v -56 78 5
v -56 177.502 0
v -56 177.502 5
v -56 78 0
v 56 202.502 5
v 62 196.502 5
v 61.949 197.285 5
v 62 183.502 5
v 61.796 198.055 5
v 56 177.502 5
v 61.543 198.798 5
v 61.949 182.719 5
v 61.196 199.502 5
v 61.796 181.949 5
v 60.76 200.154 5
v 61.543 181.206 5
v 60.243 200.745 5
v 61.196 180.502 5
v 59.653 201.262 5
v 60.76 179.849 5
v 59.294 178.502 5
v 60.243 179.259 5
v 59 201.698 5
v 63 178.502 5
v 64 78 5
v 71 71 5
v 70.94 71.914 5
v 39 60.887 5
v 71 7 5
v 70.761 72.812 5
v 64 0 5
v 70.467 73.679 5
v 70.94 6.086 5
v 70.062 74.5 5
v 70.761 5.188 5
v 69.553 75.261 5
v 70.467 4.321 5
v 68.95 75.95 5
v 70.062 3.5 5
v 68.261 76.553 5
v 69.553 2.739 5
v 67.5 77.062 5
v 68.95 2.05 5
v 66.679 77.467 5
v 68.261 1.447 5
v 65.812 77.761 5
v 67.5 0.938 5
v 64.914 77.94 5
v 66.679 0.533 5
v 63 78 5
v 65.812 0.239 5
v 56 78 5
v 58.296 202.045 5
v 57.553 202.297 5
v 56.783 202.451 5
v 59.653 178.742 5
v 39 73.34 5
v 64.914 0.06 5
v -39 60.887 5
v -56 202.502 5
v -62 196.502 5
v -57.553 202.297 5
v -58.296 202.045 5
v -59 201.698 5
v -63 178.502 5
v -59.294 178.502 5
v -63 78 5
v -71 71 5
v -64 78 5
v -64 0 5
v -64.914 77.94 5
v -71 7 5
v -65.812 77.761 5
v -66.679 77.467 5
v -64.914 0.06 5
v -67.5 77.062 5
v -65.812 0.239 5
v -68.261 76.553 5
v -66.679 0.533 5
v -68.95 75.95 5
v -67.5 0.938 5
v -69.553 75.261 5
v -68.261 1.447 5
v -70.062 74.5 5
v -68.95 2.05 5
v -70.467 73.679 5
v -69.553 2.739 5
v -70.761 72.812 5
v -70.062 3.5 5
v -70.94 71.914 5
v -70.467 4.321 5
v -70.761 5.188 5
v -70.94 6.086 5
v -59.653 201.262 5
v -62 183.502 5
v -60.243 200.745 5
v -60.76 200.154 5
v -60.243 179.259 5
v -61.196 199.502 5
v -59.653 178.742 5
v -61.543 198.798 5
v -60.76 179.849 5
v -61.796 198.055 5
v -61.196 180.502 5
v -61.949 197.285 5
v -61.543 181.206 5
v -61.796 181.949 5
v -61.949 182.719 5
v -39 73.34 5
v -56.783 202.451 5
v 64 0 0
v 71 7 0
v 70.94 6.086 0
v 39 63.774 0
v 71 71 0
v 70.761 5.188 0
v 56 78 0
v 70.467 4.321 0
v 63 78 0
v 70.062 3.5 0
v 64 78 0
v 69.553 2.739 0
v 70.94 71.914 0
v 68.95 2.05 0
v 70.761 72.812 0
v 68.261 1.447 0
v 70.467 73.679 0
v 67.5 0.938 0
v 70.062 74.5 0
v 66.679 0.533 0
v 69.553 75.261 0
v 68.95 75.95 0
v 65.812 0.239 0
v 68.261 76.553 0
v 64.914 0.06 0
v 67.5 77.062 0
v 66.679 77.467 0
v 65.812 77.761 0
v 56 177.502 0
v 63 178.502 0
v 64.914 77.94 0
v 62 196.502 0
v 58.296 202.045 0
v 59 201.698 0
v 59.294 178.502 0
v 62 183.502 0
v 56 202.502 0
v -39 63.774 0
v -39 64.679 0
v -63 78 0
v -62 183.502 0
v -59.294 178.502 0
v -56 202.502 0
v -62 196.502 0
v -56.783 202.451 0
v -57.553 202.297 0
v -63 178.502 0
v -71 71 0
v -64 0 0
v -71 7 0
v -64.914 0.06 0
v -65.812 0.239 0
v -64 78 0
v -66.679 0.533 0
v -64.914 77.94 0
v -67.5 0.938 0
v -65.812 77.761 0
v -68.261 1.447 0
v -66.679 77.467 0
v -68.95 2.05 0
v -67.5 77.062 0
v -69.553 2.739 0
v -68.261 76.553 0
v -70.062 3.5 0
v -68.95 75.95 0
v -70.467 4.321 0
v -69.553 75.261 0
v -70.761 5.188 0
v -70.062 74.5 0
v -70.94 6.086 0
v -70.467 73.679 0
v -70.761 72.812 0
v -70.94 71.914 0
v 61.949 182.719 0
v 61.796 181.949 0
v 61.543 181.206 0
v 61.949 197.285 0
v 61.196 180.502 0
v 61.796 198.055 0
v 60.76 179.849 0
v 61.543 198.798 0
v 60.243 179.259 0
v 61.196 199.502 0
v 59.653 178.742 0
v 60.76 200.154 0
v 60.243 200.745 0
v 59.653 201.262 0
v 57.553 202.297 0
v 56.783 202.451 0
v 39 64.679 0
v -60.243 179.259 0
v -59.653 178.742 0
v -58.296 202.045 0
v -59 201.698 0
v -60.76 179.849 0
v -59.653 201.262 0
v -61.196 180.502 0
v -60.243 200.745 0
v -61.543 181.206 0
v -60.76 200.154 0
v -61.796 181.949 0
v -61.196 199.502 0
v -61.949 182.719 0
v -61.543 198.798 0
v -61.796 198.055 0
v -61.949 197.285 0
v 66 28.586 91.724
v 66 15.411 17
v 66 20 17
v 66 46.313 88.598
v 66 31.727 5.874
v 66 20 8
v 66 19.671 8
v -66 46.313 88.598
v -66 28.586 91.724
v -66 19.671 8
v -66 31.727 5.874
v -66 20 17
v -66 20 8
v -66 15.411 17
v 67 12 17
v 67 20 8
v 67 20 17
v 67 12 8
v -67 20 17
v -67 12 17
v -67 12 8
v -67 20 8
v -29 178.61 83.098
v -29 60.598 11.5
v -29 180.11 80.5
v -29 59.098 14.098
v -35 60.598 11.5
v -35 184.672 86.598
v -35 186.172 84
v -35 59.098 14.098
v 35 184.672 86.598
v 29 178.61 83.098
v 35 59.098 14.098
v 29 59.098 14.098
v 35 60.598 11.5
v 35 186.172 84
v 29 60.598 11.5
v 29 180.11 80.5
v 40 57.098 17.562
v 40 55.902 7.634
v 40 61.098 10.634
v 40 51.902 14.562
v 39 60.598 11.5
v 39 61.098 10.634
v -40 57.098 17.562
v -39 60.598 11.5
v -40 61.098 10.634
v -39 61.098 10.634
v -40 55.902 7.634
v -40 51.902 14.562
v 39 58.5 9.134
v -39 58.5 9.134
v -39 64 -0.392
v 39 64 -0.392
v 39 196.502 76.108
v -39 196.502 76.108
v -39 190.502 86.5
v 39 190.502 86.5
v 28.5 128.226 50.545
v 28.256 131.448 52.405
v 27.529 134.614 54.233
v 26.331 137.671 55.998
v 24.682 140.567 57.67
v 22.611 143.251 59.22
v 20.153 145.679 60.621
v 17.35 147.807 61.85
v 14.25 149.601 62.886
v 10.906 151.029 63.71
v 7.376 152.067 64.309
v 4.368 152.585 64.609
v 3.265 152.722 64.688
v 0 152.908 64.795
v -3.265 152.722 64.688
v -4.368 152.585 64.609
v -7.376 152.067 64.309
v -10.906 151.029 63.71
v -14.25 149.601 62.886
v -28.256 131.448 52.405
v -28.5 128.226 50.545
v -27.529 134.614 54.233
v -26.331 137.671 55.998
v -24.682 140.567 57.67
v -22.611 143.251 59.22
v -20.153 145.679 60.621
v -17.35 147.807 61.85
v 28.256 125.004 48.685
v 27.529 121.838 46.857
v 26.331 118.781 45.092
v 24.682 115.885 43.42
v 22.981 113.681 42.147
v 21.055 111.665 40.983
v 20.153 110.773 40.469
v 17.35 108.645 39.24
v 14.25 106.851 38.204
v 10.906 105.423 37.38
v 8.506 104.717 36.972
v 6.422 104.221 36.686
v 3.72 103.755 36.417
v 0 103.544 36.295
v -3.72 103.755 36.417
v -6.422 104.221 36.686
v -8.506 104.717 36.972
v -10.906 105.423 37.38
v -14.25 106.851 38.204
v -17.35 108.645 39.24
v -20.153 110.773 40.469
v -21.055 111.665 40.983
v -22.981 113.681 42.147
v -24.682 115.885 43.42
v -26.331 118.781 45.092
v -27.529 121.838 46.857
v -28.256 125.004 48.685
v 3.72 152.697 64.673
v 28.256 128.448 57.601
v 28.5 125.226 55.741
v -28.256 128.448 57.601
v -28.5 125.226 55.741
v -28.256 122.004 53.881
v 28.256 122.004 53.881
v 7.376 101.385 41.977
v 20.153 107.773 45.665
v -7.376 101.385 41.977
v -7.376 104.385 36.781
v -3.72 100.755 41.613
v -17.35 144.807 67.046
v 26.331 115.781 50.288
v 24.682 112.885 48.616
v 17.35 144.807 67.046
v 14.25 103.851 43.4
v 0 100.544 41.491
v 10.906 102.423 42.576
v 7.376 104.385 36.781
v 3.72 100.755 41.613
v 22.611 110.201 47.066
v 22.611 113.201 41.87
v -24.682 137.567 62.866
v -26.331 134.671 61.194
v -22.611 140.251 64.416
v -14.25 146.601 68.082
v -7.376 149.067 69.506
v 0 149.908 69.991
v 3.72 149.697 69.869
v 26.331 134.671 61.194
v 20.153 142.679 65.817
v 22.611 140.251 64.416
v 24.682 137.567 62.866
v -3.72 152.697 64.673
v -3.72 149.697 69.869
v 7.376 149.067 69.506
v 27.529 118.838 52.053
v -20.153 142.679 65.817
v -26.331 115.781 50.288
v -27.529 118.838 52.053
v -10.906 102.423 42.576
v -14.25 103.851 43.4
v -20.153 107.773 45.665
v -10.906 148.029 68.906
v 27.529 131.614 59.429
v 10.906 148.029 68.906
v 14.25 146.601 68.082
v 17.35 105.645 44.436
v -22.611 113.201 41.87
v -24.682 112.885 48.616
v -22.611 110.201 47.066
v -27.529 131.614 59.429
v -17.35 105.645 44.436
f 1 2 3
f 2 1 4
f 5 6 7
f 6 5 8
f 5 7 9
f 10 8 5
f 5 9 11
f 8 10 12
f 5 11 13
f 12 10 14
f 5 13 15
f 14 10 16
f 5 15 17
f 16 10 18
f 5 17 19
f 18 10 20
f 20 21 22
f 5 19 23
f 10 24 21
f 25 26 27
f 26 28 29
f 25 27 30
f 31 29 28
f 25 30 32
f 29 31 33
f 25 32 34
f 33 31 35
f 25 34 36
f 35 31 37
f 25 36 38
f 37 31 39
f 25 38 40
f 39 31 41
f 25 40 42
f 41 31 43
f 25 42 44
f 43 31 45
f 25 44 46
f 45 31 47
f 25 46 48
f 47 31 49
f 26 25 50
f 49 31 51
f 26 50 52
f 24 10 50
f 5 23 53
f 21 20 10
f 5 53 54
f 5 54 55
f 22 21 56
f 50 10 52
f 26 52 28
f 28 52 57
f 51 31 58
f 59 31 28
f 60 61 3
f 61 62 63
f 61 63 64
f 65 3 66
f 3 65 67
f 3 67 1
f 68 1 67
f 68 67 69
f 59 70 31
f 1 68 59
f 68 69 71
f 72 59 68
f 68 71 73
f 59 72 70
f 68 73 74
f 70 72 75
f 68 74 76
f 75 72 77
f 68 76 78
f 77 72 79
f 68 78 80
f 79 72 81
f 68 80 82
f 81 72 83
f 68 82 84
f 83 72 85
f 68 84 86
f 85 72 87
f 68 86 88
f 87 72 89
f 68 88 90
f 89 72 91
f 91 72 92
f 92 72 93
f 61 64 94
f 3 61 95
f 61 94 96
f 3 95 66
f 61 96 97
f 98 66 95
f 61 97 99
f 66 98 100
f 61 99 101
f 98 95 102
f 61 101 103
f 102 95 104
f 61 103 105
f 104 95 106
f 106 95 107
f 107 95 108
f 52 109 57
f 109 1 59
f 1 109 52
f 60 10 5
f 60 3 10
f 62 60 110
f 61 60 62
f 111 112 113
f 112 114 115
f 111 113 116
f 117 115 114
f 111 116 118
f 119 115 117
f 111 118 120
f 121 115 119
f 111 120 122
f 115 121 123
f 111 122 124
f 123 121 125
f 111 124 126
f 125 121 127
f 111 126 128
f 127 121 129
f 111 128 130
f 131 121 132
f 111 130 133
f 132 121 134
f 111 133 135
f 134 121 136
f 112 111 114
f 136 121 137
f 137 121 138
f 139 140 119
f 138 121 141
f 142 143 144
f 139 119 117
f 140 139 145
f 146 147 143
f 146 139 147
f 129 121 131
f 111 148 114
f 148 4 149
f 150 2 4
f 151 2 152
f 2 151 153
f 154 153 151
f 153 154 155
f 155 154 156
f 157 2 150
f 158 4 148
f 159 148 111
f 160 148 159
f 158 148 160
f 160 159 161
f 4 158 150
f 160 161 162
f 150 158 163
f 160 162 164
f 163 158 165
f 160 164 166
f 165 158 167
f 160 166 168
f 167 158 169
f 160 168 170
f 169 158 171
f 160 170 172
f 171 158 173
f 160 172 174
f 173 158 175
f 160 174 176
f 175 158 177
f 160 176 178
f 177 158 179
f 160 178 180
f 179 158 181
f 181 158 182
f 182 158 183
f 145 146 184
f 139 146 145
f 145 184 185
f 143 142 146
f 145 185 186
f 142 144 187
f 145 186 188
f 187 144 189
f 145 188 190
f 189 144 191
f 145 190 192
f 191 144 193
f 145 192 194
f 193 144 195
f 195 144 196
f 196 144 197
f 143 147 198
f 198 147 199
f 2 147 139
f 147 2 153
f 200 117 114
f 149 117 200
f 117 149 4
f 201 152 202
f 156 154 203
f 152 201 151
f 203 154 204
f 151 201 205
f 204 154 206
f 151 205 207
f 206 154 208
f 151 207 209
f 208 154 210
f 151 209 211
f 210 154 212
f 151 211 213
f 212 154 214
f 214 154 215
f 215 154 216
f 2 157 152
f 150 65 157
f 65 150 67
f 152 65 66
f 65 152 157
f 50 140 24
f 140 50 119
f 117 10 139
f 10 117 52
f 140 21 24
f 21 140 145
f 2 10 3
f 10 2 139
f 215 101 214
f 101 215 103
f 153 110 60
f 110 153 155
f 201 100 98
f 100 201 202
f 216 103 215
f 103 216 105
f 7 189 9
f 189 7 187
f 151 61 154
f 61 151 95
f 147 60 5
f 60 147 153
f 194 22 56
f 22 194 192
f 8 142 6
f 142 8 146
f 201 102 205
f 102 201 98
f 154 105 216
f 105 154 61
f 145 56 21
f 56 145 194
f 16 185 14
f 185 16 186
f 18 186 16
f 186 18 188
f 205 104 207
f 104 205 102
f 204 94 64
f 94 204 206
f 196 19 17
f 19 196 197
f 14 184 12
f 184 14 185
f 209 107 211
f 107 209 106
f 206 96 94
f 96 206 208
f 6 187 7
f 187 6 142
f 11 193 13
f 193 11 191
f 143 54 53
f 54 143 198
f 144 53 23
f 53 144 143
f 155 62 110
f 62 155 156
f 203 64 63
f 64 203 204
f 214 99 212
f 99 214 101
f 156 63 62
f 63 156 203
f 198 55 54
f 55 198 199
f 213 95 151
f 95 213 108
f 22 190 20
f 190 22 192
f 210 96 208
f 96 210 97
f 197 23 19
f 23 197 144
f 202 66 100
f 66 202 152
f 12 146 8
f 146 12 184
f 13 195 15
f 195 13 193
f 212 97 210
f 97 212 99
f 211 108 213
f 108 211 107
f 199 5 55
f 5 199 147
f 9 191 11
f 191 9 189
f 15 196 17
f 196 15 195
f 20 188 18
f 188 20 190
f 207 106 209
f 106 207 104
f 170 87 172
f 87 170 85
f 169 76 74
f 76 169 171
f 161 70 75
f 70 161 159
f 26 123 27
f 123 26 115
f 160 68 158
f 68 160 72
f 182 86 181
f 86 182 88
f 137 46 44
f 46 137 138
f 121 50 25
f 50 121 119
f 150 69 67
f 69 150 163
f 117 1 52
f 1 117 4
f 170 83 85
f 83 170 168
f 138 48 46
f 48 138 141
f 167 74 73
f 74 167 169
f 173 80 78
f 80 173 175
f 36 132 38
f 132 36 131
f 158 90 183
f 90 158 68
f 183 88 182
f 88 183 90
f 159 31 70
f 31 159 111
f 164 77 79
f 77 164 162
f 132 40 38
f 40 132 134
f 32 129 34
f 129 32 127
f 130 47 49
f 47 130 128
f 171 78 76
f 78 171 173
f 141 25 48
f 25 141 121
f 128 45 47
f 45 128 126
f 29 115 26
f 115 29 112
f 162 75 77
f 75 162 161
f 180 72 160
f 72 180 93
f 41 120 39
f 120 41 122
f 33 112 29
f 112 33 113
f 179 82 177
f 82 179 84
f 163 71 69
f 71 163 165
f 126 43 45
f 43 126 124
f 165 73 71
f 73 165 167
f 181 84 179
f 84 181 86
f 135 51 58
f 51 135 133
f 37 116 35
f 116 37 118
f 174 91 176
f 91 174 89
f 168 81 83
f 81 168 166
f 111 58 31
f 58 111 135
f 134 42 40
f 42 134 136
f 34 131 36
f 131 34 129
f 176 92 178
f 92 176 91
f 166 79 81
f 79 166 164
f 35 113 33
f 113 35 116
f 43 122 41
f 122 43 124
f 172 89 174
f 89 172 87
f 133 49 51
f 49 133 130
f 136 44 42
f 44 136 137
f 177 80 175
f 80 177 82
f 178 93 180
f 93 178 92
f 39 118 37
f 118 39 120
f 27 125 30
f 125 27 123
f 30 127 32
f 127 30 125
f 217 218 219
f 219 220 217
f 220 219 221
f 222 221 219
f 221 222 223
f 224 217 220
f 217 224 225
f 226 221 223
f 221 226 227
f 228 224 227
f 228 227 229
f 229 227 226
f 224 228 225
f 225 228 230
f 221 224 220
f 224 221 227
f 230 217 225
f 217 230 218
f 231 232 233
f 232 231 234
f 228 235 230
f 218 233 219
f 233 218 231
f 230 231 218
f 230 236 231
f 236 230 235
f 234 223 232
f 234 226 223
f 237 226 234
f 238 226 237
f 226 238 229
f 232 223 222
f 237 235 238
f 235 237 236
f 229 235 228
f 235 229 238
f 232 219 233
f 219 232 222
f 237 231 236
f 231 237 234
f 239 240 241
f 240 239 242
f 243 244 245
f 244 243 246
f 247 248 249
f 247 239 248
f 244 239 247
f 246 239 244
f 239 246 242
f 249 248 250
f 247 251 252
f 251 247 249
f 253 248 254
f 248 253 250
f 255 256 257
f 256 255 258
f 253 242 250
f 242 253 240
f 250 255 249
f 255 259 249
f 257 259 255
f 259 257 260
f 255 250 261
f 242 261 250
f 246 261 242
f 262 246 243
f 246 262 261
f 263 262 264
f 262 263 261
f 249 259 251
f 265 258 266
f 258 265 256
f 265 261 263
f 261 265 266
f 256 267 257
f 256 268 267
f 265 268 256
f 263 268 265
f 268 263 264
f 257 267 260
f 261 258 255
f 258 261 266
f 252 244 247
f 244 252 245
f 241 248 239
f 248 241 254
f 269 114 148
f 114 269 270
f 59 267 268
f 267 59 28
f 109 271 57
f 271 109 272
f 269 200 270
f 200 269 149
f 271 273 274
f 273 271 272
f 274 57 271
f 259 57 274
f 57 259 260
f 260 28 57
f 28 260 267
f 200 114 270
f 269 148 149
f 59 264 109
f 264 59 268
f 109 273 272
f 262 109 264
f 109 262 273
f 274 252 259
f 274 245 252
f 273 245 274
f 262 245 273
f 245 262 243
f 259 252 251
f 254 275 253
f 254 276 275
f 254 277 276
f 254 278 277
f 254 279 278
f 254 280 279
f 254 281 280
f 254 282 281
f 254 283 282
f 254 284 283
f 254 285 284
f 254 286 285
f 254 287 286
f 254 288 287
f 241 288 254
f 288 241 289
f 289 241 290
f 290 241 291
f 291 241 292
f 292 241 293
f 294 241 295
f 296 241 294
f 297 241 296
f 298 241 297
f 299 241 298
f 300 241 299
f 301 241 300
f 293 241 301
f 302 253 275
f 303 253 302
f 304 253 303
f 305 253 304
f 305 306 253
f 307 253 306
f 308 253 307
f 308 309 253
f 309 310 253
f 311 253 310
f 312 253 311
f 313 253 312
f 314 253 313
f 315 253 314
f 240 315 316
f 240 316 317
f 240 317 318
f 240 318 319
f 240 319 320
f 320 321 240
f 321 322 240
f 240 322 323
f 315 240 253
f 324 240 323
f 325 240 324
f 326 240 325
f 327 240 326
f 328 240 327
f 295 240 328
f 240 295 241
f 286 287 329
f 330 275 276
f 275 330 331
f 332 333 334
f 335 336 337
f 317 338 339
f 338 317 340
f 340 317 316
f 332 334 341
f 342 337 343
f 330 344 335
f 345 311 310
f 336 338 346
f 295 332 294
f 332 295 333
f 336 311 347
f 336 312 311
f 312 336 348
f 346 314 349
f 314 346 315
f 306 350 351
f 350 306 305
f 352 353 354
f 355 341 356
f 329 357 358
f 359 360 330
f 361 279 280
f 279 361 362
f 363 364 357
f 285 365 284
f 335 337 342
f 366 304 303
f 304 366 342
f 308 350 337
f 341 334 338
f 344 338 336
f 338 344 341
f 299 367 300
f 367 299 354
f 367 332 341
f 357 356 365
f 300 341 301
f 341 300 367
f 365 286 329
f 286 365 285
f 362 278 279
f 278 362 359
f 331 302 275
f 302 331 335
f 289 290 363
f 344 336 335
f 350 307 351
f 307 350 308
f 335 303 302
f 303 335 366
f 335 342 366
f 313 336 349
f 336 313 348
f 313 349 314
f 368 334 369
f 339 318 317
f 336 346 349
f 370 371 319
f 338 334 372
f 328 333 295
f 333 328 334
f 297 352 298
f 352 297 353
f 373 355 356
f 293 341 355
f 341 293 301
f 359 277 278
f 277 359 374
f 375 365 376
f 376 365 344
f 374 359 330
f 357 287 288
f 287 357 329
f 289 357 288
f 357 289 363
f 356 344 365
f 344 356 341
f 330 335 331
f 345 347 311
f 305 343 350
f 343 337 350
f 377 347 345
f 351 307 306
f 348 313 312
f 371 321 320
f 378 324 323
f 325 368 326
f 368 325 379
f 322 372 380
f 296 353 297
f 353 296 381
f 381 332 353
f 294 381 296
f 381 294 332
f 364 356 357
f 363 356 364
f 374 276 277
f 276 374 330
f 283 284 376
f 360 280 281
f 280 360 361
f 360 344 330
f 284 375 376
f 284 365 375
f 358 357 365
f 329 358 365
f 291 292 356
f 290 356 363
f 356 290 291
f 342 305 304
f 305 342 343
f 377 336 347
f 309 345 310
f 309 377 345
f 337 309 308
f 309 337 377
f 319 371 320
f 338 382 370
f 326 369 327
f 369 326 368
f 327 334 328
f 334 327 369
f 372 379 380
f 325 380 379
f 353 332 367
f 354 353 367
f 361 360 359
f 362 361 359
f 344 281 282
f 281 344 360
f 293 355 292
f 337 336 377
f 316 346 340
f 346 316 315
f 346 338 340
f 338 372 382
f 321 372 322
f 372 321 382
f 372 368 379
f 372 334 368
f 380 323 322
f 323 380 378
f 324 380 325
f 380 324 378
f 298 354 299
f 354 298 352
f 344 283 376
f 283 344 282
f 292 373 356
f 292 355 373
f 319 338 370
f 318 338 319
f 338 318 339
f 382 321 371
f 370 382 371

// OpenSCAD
// PokéDock V11 adjustable *fit mockup*, NOT production tooling.
// Coordinates: x = width, y = rear, z = height, millimeters.
// IMPORTANT: replace all SAMPLE dimensions using actual 4.3C-BOX,
// iPhone+case and protected MagSafe puck measurements before fabrication.
// Manufacturer reference: hardware/dimensions/4.3C-2D.dxf and 4.3C-3D.stp
// in waveshareteam/ESP32-S3-Touch-LCD-4.3C; cased 33630 still must be measured.
// This preview deliberately does not model USB/power/RTC/antenna holes.
// Do not glue, drill or encapsulate the charger using these sample values.
$fn=48;

// SAMPLE / NOT MEASURED. Verify each before manufacturing.
CASE_W = 132;          // measured widest 4.3C-BOX plastic outside width
CASE_H = 84;           // measured plastic case outside height
CASE_D = 18;           // measured plastic case thickness
PHONE_W = 78;          // actual phone with everyday case width
PHONE_H = 153;         // actual phone with everyday case height
PHONE_T = 12;          // actual phone with case/camera thickness max
PHONE_ANGLE = 30;      // degrees up from desk, low enough to tuck behind screen
CHARGER_D = 57;        // actual complete MagSafe puck outside diameter
CHARGER_T = 6;         // actual puck thickness incl. relief
MARGIN_X = 5;          // side margin
CLEARANCE = 2;         // mechanical prototype spacing allowance
BASE_FRONT_D = 78;     // shallow main front footprint, not overall depth
BASE_THICK = 5;
BASE_W = max(CASE_W+2*MARGIN_X,PHONE_W+2*MARGIN_X);
FRONT_PANEL_ANGLE = 80; // from desk; visual placeholder
PHONE_BOTTOM_Y = 58;   // where phone lower edge rests; measure USB access
PHONE_BOTTOM_Z = 10;
SUPPORT_T = 3;
SHOW_PHONE_MOCK = true;
SHOW_HMI_MOCK = true;
SHOW_QI_GUIDE = true;
SHOW_OPTIONAL_NFC = false; // optional side module deferred until phase B

// Derived geometry: tall upright portrait iPhone will stick above the screen.
PHONE_REAR_EXTENSION = PHONE_H*cos(PHONE_ANGLE);
PHONE_TOP_Z = PHONE_BOTTOM_Z + PHONE_H*sin(PHONE_ANGLE);
PHONE_REAR_Y = PHONE_BOTTOM_Y + PHONE_REAR_EXTENSION;
TOTAL_DESK_DEPTH_APPROX = max(BASE_FRONT_D,PHONE_REAR_Y+8);

echo("PHONE TOP HEIGHT ABOVE DESK (sample)=",PHONE_TOP_Z);
echo("PHONE REAR EXTENT FROM FRONT DATUM (sample)=",PHONE_REAR_Y);
echo("TOTAL DESK DEPTH / NO FRONT TRAY (sample)=",TOTAL_DESK_DEPTH_APPROX);
echo("CASE HEIGHT SAMPLE=",CASE_H);
if(PHONE_TOP_Z > CASE_H+10)
  echo("WARNING: upright phone likely protrudes above front HMI; prototype first.");
if(CHARGER_D>PHONE_W-2*CLEARANCE)
  echo("WARNING: charger puck wider than phone surface allowance.");

module rounded_plate(w,d,h,r=6){
  hull() for(x=[-w/2+r,w/2-r]) for(y=[r,d-r])
    translate([x,y,0]) cylinder(h=h,r=r);
}

// A simple rear-reaching stabilizer frame, NOT a sized structural design.
module rear_foot(){
  color([.37,.31,.45])
  translate([0,PHONE_REAR_Y-13,0]) rounded_plate(BASE_W-18,25,BASE_THICK,6);
  for(x=[-BASE_W/2+8,BASE_W/2-15])
    color([.4,.35,.49]) translate([x,BASE_FRONT_D-12,0])
    cube([7,max(1,PHONE_REAR_Y-BASE_FRONT_D),BASE_THICK]);
}

module front_base(){
  color([.39,.32,.5]) rounded_plate(BASE_W,BASE_FRONT_D,BASE_THICK,7);
  rear_foot();
}

// Simple tablet-style front display visual mock — NO fastening holes defined.
module hmi_mock(){
  color([.15,.14,.19,.85])
  translate([-CASE_W/2,14,BASE_THICK+4])
    rotate([-(90-FRONT_PANEL_ANGLE),0,0])
    cube([CASE_W,CASE_D,CASE_H]);
  color([.30,.32,.35,.8])
  translate([-CASE_W/2-1,12,BASE_THICK+3]) cube([CASE_W+2,8,9]);
}

// Rear phone plane: local z axis is along long phone side.
module phone_axis() {
  translate([0,PHONE_BOTTOM_Y,PHONE_BOTTOM_Z])
    rotate([-(90-PHONE_ANGLE),0,0])
      children();
}

module rear_support(){
  phone_axis(){
    // Two rails keep a removable MagSafe puck open and accessible.
    color([.62,.54,.72])
    for(x=[-PHONE_W/2+4,PHONE_W/2-10]) translate([x,-SUPPORT_T,-1])
      cube([6,SUPPORT_T,PHONE_H-6]);
    // lower stop only. It must not obstruct phone port or press screen.
    color([.38,.32,.5]) translate([-PHONE_W/2-1,-SUPPORT_T-4,-3])
      cube([PHONE_W+2,SUPPORT_T+5,6]);
    // top bridging strap is a conceptual guide; final requires access.
    color([.55,.48,.66]) translate([-PHONE_W/2+4,-SUPPORT_T,PHONE_H-12])
      cube([PHONE_W-8,SUPPORT_T,7]);
  }
  // Supports need engineering based on actual device mass and moment,
  // not just a single visual brace. Leave them open and removable.
}

module phone_mock(){
  phone_axis() color([.23,.27,.37,.35])
    translate([-PHONE_W/2,0,0]) cube([PHONE_W,PHONE_T,PHONE_H]);
}

module qi_reference(){
  phone_axis(){
    translate([0,-CHARGER_T/2,PHONE_H*0.53])
      rotate([90,0,0])
      color([.92,.72,.25,.6]) cylinder(d=CHARGER_D,h=CHARGER_T,center=true);
  }
}

module nfc_future(){
  // Not purchased/installed until electrical noise and range validated.
  color([.25,.61,.75,.45])
  translate([BASE_W/2+14,21,BASE_THICK]) cylinder(d=28,h=3);
}

front_base();
if(SHOW_HMI_MOCK) hmi_mock();
rear_support();
if(SHOW_PHONE_MOCK) phone_mock();
if(SHOW_QI_GUIDE) qi_reference();
if(SHOW_OPTIONAL_NFC) nfc_future();

// This preview intentionally has no permanent attachment holes, no mains
// components, no battery, and no precise camera/cable/antenna relief.
